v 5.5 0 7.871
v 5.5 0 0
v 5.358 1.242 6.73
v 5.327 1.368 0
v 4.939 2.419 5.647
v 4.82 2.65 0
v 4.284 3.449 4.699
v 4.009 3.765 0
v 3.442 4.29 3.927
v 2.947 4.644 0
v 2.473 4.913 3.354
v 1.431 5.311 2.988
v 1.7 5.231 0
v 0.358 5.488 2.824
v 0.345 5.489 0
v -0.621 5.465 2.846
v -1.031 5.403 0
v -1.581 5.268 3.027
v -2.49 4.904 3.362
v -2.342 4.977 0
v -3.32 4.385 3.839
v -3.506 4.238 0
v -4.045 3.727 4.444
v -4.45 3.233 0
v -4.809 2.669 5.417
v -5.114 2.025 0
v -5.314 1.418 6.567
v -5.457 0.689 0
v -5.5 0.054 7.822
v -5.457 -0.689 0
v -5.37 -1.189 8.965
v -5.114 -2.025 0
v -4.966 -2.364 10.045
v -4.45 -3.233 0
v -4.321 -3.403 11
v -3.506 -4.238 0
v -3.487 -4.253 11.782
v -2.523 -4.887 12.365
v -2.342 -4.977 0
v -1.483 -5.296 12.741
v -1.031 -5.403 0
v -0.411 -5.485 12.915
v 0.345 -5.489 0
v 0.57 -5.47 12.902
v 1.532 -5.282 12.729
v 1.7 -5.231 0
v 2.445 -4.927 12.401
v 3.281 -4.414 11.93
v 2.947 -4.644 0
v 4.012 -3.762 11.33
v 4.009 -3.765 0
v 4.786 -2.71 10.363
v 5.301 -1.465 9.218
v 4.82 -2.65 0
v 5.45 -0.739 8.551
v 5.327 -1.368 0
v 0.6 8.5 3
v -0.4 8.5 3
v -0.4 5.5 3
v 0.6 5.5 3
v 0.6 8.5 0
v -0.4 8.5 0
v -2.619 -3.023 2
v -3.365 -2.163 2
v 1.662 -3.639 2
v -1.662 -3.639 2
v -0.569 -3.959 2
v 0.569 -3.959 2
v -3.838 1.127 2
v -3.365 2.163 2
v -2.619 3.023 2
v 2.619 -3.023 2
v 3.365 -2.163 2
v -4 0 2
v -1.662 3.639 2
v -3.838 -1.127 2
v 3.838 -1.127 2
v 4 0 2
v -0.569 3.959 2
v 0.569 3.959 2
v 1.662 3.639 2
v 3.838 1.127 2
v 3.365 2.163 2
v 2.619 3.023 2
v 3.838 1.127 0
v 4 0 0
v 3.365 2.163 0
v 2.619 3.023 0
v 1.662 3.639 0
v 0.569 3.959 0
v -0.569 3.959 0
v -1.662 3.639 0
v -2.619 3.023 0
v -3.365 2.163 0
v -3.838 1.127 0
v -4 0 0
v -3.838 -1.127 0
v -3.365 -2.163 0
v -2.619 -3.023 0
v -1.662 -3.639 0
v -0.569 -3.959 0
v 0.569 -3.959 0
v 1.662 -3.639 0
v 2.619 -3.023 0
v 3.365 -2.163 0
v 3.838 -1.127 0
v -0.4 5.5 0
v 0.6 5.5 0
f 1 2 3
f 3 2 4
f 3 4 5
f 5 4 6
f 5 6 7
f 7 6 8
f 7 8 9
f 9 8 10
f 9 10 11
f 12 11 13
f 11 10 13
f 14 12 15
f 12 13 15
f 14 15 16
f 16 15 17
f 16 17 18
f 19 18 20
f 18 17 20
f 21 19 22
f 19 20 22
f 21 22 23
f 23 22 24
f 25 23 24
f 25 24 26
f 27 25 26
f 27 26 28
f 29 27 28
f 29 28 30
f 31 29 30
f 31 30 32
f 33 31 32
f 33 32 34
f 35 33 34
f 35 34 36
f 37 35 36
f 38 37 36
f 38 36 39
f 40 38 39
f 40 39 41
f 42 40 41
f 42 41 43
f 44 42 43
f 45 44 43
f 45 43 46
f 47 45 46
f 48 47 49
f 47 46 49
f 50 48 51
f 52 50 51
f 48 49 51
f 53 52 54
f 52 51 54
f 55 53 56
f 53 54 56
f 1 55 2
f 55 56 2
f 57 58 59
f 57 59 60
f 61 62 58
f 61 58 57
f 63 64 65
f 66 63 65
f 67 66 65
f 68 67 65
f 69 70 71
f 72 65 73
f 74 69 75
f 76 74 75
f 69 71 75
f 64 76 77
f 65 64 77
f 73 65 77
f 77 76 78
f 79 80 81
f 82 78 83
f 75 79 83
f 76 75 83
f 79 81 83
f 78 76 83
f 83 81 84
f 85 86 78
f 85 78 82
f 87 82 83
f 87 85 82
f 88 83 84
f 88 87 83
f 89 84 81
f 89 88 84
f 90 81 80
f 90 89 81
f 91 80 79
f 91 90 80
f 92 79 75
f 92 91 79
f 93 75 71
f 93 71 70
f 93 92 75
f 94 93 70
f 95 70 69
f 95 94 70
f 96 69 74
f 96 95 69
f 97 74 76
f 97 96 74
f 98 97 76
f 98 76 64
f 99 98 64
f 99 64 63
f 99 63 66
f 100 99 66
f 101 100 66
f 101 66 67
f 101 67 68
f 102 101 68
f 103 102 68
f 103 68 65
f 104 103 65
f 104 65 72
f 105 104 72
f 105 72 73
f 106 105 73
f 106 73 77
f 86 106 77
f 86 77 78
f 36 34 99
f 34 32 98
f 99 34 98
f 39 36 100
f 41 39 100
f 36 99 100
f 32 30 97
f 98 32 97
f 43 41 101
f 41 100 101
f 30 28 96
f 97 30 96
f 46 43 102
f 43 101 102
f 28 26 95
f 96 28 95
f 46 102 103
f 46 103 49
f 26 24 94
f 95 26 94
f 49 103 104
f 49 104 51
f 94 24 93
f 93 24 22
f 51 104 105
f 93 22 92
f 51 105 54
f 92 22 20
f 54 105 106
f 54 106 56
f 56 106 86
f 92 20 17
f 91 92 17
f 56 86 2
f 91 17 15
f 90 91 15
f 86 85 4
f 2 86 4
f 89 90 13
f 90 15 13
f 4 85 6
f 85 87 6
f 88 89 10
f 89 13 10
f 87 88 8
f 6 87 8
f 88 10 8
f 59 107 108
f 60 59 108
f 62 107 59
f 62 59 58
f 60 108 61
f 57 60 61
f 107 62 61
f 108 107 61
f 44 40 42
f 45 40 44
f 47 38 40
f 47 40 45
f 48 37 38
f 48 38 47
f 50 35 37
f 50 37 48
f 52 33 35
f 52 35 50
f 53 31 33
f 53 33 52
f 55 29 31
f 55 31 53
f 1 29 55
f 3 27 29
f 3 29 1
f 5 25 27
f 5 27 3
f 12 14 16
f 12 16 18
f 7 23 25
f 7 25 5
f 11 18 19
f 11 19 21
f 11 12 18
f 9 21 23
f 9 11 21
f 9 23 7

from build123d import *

# Parameters (mm, degrees)
BOX001_W               = 1
BOX001_H               = 3
BOX001_DEPTH           = 3
BOX002_W               = 16
BOX002_H               = 22
BOX002_DEPTH           = 13
BOX002_PLACEMENT_ANGLE = 42.6
CYLINDER002_R          = 4
CYLINDER002_DEPTH      = 15
BOX_W                  = 16
BOX_H                  = 22
BOX_DEPTH              = 13
BOX_PLACEMENT_ANGLE    = 42.6
CYLINDER001_R          = 4
CYLINDER001_DEPTH      = 15
CYLINDER_R             = 5.5
CYLINDER_DEPTH         = 13


with BuildPart() as cube001:
    # Box001 → Box001 (new body)
    with BuildSketch(Plane(origin=(-0.4, 5.5, 0), x_dir=(1, 0, 0), z_dir=(0, 0, 1))):
        with Locations((0.5, 1.5)):
            Rectangle(BOX001_W, BOX001_H)
    extrude(amount=BOX001_DEPTH)


with BuildPart() as cube002:
    # Box002 → Box002 (new body)
    with BuildSketch(Plane.XY):
        with Locations((8, 11)):
            Rectangle(BOX002_W, BOX002_H)
    extrude(amount=BOX002_DEPTH)


with BuildPart() as cube002_1:
    # Box002 placement: moved
    add(cube002.part.moved(Location((-7.1, -7.1, 14.4))).rotate(Axis((-7.1, -7.1, 14.4), (-1, 0, 0)), BOX002_PLACEMENT_ANGLE))


with BuildPart() as cut002:
    # Cylinder002 → Cylinder002 (new body)
    with BuildSketch(Plane.XY.offset(2)):
        Circle(CYLINDER002_R)
    extrude(amount=CYLINDER002_DEPTH)

    # Cut002: cut Cube002
    add(cube002_1.part, mode=Mode.SUBTRACT)


with BuildPart() as cube:
    # Box → Box (new body)
    with BuildSketch(Plane.XY):
        with Locations((8, 11)):
            Rectangle(BOX_W, BOX_H)
    extrude(amount=BOX_DEPTH)


with BuildPart() as cube_1:
    # Box placement: moved
    add(cube.part.moved(Location((-7.1, -7.1, 14.4))).rotate(Axis((-7.1, -7.1, 14.4), (-1, 0, 0)), BOX_PLACEMENT_ANGLE))


with BuildPart() as cylinder001:
    # Cylinder001 → Cylinder001 (new body)
    with BuildSketch(Plane.XY):
        Circle(CYLINDER001_R)
    extrude(amount=CYLINDER001_DEPTH)


with BuildPart() as fusion:
    # Cylinder → Cylinder (new body)
    with BuildSketch(Plane.XY):
        Circle(CYLINDER_R)
    extrude(amount=CYLINDER_DEPTH)

    # Cut: cut Cylinder001
    add(cylinder001.part, mode=Mode.SUBTRACT)

    # Cut001: cut Cube
    add(cube_1.part, mode=Mode.SUBTRACT)

    # Fusion: union Cut002
    add(cut002.part)


solid = Compound([cube001.part, fusion.part])
